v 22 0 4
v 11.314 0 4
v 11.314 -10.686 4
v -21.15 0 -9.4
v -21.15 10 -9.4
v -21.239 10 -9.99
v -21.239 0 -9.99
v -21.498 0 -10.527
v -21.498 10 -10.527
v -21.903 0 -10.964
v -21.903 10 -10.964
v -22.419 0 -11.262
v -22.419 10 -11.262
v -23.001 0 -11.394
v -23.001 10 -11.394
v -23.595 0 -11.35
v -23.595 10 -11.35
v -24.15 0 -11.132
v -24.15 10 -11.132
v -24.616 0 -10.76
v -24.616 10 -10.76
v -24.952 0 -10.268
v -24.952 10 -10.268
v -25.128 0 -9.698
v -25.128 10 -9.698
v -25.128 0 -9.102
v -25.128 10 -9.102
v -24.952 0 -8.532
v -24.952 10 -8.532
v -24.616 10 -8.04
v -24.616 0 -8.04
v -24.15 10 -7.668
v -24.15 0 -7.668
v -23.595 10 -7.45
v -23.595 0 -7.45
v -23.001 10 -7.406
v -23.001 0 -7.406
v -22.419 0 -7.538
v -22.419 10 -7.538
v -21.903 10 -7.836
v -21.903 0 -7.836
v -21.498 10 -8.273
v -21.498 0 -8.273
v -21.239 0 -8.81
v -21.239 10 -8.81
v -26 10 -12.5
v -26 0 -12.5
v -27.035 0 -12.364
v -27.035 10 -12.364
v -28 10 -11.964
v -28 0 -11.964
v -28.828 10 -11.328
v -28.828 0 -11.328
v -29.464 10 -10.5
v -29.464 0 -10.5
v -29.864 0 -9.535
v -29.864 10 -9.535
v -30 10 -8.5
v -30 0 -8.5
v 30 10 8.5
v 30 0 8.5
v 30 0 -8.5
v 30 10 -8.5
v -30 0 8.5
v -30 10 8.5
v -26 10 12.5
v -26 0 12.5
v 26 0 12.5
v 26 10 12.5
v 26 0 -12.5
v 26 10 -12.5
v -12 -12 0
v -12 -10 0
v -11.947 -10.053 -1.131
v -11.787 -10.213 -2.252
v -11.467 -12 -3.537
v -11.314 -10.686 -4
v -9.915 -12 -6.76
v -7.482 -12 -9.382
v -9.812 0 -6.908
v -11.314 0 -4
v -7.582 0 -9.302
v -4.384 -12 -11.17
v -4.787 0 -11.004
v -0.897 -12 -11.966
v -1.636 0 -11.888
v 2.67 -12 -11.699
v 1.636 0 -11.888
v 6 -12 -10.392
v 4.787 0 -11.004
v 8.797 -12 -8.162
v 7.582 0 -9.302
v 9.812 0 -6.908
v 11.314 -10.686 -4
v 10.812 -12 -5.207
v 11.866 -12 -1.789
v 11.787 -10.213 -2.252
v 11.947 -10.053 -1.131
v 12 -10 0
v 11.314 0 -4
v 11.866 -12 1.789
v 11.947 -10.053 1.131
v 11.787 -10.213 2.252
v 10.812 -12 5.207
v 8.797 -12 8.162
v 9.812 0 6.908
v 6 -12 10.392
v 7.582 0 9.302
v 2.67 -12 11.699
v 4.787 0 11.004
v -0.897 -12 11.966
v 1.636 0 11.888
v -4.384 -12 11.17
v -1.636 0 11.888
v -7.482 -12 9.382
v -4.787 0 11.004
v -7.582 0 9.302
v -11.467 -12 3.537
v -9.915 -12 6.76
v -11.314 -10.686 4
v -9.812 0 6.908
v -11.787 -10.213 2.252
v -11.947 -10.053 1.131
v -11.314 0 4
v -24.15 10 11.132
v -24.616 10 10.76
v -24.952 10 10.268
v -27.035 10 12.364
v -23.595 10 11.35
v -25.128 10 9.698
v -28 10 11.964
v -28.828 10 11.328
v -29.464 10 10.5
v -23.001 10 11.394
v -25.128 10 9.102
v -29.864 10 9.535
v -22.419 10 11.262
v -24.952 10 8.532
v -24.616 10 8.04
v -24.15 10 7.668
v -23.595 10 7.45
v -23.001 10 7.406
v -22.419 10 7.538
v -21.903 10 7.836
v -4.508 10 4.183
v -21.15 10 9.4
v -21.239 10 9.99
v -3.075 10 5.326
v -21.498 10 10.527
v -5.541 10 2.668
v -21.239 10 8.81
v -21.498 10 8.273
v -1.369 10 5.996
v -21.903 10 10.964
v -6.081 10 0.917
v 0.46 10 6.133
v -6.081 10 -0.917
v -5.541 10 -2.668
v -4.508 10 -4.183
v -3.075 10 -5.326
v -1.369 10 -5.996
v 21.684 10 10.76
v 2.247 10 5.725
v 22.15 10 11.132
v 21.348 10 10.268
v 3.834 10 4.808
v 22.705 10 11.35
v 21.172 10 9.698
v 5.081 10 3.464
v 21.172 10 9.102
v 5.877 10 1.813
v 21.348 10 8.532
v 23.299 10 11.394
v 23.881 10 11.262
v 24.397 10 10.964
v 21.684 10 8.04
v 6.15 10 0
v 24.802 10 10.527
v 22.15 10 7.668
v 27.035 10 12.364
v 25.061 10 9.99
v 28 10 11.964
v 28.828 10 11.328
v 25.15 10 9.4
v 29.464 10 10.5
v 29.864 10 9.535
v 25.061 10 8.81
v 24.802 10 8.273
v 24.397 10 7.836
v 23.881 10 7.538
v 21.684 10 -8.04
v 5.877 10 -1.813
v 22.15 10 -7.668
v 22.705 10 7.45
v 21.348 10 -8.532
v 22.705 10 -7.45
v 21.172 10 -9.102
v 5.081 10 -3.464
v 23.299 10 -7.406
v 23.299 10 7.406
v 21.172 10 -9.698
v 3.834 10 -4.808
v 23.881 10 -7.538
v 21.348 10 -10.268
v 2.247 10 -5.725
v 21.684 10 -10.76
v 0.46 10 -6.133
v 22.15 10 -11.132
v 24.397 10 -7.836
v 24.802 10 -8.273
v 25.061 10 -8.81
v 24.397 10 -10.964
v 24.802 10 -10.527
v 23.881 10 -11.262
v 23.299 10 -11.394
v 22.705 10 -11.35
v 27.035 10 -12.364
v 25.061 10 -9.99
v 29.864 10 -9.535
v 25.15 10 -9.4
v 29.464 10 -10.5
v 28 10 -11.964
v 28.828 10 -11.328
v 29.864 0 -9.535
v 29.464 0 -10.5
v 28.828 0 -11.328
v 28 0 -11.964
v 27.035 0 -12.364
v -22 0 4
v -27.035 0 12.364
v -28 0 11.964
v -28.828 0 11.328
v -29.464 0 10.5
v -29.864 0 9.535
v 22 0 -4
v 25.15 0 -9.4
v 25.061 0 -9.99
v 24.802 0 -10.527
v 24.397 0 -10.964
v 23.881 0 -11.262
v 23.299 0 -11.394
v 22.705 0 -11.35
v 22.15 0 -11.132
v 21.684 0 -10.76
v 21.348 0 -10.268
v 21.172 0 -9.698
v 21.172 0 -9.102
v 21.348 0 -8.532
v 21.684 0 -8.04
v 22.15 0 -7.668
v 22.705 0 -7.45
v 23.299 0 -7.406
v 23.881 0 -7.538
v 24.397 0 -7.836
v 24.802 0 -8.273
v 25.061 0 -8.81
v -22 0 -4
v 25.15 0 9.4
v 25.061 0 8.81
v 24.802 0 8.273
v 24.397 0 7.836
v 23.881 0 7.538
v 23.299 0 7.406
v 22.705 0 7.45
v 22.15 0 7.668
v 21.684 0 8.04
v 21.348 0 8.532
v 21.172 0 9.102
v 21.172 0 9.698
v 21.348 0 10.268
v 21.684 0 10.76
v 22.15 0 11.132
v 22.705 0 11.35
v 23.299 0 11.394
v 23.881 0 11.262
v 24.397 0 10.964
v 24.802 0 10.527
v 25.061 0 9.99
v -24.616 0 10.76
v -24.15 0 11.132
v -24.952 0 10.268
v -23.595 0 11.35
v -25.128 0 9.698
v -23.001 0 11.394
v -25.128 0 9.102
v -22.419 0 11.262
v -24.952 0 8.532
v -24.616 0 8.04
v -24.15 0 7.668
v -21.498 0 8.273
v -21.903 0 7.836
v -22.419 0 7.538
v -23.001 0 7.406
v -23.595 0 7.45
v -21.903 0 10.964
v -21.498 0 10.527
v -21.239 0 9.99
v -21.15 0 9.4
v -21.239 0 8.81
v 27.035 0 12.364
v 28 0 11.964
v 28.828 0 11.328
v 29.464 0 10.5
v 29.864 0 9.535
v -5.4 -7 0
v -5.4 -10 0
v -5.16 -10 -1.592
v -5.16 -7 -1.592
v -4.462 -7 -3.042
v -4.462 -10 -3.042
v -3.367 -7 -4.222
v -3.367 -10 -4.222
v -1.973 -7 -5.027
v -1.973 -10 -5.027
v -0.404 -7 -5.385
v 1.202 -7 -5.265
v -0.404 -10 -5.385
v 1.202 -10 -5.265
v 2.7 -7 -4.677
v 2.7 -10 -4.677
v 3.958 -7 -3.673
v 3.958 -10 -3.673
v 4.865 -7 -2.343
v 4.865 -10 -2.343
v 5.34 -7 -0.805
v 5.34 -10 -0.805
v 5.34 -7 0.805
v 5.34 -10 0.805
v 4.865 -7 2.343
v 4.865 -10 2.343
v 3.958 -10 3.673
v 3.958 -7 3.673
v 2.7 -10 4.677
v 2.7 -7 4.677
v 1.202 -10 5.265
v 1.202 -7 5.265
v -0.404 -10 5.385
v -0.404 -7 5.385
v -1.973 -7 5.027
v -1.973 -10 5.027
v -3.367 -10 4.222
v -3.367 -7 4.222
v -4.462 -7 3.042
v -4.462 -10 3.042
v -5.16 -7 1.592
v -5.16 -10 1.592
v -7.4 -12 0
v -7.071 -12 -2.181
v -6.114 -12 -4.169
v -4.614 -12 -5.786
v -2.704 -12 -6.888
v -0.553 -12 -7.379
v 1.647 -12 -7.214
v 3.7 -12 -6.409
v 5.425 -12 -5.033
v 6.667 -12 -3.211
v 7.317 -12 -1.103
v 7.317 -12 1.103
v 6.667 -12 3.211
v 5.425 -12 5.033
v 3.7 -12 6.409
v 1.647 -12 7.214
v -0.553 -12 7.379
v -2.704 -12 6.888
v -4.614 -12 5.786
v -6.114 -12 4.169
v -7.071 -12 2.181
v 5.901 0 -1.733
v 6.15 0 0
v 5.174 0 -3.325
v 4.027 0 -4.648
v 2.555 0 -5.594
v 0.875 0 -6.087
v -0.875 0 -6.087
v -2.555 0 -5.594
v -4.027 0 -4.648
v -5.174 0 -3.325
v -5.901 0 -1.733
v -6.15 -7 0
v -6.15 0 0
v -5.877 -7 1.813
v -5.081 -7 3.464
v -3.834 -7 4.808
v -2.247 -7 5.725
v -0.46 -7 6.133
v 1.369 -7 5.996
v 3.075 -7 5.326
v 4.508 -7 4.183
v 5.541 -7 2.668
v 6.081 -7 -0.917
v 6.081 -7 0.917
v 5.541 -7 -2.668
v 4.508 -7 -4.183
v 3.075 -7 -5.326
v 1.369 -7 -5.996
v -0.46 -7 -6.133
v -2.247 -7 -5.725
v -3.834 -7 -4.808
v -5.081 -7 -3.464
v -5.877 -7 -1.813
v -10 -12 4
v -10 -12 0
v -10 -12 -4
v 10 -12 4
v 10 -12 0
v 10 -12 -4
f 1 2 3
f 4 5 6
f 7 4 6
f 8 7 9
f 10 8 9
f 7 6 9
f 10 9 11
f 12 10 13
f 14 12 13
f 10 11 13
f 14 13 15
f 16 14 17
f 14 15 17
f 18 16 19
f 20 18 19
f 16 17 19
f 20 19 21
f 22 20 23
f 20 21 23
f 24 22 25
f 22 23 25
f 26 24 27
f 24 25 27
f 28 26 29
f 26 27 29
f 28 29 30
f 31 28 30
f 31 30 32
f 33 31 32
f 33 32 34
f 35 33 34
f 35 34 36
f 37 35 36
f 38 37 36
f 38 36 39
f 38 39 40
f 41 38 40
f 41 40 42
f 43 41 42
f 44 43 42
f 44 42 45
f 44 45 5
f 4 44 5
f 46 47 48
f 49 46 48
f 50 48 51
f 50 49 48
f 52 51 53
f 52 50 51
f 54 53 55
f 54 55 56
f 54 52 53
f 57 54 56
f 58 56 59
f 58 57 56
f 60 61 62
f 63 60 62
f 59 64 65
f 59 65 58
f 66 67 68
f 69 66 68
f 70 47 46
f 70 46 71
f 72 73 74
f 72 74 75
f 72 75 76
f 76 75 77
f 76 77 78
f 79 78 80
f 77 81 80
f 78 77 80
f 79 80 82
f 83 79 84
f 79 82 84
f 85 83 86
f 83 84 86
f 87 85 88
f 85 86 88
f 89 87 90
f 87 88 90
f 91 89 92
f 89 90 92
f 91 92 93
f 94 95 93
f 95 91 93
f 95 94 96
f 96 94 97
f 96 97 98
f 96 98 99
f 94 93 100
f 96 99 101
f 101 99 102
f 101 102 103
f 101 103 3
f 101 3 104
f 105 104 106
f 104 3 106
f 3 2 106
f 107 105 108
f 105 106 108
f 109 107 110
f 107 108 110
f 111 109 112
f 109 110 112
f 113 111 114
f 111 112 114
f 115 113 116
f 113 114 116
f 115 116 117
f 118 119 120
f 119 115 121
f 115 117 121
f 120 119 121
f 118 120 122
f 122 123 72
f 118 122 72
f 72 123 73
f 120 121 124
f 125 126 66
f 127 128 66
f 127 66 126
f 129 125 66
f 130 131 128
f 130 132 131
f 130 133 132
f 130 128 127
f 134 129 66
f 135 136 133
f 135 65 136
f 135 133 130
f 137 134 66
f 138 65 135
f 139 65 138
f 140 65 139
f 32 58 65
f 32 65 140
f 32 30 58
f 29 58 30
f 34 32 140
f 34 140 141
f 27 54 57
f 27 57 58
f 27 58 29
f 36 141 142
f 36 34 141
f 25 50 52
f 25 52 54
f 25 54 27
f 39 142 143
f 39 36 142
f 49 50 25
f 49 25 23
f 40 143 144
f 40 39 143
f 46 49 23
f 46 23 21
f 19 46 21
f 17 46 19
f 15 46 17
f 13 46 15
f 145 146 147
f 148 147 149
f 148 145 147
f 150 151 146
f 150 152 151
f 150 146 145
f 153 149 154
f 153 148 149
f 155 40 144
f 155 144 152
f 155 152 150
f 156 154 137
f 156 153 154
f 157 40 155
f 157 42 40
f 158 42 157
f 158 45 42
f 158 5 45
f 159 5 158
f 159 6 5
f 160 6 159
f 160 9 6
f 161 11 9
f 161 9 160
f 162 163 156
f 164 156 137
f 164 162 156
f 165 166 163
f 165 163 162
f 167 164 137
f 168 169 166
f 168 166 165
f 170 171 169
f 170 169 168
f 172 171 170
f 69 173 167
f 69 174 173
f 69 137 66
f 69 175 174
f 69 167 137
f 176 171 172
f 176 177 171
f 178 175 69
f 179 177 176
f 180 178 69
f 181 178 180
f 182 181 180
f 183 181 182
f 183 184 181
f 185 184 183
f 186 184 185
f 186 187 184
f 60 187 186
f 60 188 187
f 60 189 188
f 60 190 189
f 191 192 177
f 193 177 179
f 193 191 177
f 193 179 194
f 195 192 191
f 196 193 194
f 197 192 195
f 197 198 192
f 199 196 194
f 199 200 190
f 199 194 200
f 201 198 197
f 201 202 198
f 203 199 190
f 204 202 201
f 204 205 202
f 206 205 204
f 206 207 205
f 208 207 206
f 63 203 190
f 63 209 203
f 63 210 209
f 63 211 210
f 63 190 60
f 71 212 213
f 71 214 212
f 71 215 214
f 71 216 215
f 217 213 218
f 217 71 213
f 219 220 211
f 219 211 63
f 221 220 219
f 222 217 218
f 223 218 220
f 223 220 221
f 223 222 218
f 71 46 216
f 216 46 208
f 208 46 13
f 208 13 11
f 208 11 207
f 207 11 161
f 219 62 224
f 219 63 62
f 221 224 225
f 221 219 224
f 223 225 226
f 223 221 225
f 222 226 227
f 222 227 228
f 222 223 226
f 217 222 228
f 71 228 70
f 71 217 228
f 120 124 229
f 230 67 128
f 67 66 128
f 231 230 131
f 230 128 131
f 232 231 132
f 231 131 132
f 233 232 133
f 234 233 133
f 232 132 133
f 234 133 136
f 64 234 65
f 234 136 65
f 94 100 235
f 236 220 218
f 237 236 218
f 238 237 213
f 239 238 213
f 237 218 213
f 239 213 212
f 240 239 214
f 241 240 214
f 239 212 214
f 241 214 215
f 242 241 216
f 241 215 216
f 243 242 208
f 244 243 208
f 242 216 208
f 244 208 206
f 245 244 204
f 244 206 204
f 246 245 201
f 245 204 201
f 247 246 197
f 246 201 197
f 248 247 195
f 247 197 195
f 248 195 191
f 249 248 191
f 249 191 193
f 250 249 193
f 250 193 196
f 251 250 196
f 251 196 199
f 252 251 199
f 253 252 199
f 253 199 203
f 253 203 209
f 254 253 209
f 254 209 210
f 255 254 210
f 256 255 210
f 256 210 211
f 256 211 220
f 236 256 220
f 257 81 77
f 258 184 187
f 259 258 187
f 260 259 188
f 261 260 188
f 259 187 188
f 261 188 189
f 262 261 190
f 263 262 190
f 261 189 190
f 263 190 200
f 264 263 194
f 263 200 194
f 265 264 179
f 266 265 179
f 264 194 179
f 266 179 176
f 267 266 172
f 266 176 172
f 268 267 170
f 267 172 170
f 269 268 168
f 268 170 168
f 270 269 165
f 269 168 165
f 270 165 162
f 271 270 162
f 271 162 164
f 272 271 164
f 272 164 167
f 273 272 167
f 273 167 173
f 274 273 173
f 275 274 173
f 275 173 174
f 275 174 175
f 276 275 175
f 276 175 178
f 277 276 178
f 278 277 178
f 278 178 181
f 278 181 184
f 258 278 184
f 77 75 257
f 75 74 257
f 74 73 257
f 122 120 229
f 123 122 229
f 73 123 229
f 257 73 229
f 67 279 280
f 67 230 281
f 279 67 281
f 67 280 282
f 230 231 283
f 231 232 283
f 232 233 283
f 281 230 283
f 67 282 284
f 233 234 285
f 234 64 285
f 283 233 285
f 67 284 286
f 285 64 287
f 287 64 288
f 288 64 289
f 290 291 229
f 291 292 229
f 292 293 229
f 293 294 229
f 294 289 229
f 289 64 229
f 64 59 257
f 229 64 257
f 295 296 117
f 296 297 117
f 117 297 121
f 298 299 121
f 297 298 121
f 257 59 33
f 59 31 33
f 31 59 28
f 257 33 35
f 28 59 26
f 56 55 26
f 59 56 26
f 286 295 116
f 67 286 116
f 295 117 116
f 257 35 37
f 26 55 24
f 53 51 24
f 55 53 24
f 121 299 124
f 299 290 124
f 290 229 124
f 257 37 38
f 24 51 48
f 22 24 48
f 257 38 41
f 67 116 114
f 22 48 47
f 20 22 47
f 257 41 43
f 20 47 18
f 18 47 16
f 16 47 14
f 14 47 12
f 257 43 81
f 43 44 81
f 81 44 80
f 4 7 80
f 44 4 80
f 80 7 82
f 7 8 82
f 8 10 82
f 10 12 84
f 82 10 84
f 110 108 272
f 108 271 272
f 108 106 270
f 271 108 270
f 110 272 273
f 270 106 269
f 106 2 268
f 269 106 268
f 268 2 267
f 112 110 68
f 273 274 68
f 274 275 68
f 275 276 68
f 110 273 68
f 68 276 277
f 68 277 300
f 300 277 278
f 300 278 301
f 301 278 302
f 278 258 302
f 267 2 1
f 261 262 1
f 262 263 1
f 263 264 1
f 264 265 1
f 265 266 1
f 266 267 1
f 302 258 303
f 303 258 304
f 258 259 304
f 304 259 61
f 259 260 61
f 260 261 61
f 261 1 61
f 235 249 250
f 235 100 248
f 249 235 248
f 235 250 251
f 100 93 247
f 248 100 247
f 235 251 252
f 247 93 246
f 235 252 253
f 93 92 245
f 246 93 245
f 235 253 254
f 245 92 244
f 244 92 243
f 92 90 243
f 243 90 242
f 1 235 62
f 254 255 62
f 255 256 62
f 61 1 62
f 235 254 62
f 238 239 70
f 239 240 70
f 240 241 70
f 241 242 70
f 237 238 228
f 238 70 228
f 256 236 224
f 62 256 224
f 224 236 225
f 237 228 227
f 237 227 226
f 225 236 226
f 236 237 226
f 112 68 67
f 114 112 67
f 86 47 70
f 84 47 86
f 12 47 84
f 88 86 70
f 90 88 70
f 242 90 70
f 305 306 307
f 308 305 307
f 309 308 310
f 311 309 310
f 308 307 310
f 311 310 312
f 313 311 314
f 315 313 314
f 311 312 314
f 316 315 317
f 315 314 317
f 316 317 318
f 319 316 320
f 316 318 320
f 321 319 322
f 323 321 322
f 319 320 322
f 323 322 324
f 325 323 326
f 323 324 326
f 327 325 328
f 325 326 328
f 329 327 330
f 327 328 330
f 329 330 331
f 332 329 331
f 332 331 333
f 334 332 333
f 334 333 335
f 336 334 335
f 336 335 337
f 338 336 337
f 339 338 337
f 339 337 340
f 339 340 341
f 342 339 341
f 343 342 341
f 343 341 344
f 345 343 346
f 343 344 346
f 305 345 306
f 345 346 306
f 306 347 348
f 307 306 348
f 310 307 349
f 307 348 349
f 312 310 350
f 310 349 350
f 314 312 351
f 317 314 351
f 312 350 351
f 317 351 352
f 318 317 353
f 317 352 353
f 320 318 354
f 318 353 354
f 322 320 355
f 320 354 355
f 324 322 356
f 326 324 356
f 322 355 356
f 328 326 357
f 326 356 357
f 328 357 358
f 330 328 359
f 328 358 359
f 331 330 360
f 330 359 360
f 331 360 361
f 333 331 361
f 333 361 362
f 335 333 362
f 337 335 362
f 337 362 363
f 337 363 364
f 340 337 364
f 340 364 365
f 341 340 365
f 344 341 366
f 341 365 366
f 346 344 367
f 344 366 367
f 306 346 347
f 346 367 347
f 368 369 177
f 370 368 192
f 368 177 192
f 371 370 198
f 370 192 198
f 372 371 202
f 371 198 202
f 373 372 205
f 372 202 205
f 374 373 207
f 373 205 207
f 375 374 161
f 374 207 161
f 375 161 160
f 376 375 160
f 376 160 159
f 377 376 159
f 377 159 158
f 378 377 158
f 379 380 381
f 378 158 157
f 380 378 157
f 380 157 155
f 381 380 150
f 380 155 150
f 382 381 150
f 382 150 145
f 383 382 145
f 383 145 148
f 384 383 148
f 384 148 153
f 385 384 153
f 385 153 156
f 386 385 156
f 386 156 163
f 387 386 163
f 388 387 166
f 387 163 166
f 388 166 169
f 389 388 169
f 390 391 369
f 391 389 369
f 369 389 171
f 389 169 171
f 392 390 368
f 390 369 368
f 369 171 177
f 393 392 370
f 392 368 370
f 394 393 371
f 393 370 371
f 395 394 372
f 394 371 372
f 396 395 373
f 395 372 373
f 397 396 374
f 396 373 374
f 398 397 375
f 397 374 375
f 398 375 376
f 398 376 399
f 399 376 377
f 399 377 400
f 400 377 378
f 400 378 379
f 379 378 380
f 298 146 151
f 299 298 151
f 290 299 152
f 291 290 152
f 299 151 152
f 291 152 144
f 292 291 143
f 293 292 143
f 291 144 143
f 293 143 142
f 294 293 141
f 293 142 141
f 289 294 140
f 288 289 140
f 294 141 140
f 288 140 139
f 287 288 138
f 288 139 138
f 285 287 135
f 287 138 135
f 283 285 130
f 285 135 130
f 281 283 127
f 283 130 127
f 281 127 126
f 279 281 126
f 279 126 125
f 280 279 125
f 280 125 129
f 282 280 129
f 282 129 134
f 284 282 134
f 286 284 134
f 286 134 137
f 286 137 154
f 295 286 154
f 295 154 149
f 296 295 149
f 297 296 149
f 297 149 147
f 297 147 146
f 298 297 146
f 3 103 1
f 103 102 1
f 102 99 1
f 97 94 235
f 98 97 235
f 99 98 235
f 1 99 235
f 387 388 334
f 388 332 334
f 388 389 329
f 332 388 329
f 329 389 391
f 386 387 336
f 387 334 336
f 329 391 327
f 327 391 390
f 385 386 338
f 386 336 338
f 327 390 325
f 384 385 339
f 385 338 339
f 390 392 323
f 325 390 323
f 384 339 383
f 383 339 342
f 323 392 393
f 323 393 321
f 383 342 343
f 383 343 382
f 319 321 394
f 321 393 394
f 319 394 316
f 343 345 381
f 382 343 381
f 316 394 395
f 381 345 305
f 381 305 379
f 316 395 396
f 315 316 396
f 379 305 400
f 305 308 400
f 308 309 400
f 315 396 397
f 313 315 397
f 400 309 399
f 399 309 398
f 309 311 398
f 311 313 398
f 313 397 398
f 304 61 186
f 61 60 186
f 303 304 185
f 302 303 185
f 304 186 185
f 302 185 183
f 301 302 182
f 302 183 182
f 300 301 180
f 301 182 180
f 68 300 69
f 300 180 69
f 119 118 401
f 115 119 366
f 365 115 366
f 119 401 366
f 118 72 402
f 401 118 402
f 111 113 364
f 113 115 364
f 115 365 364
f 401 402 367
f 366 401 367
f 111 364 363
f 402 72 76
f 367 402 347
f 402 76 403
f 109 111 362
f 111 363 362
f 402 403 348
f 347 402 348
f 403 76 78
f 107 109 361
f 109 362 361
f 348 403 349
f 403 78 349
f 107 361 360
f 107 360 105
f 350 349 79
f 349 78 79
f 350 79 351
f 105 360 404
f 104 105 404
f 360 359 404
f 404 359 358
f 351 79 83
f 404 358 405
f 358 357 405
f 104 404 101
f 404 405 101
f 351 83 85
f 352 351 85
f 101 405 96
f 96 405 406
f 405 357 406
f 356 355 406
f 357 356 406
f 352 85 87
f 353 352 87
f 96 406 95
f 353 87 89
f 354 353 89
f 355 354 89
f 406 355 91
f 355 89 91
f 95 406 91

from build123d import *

# Parameters (mm, degrees)
SKETCH1_W            = 60
SKETCH1_H            = 25
BASE_DEPTH           = 10
PEN_HOLE_REACH       = 24
SKETCH5_R            = 6.15
STAB_FINS_DEPTH      = 4
STAB_FINS_DEPTH_BACK = 4
BASE_DEC_R           = 4
SKETCH8_R            = 2
CUT_EXTRUDE2_DEPTH   = 23
CHAMFER1_SIZE        = 2


with BuildPart() as part:
    # Sketch1 → Base (new body)
    with BuildSketch(Plane(origin=(0, 0, 0), x_dir=(1, 0, 0), z_dir=(0, 1, 0))):
        Rectangle(SKETCH1_W, SKETCH1_H)
    extrude(amount=BASE_DEPTH)

    # Sketch2 → Pen Catch (revolve)
    with BuildSketch(Plane.XY):
        Polygon((-6.15, 0), (-6.15, -7), (-5.4, -7), (-5.4, -12), (-12, -12), (-12, 0), align=None)
    revolve(axis=Axis((0, 0, 0), (0, -1, 0)))

    # Sketch5 → Pen Hole (cut, up to next)
    with BuildSketch(Plane(origin=(0, 10, 0), x_dir=(1, 0, 0), z_dir=(0, 1, 0)), mode=Mode.PRIVATE) as pen_hole_sk1:
        Circle(SKETCH5_R)
    pen_hole_tool1 = extrude(pen_hole_sk1.sketch, amount=-PEN_HOLE_REACH, mode=Mode.PRIVATE) & part.part
    add(pen_hole_tool1.solids().sort_by_distance((0, 10, 0))[0], mode=Mode.SUBTRACT)

    # Sketch4 → Stab Fins (add, two sides)
    with BuildSketch(Plane.XY) as stab_fins_sk:
        Polygon((-22, 0), (-10, 0), (-10, -12), align=None)
        Polygon((10, -12), (22, 0), (10, 0), align=None)
    extrude(amount=STAB_FINS_DEPTH)
    extrude(stab_fins_sk.sketch, amount=-STAB_FINS_DEPTH_BACK)

    # Base Dec
    base_dec_edges = [part.edges().sort_by_distance(p)[0] for p in [
        (-30, 5, -12.5),
        (30, 5, -12.5),
        (30, 5, 12.5),
        (-30, 5, 12.5),
    ]]
    fillet(base_dec_edges, radius=BASE_DEC_R)

    # Sketch8 → Cut-Extrude2 (cut, through all)
    with BuildSketch(Plane(origin=(0, 10, 0), x_dir=(1, 0, 0), z_dir=(0, 1, 0))):
        with Locations((23.15, 9.4)):
            Circle(SKETCH8_R)
        with Locations((23.15, -9.4)):
            Circle(SKETCH8_R)
        with Locations((-23.15, 9.4)):
            Circle(SKETCH8_R)
        with Locations((-23.15, -9.4)):
            Circle(SKETCH8_R)
    extrude(amount=-CUT_EXTRUDE2_DEPTH, mode=Mode.SUBTRACT)

    # Chamfer1
    chamfer1_edges = [part.edges().sort_by_distance(p)[0] for p in [
        (5.4, -12, 0),
    ]]
    chamfer(chamfer1_edges, length=CHAMFER1_SIZE)


solid = part.part
